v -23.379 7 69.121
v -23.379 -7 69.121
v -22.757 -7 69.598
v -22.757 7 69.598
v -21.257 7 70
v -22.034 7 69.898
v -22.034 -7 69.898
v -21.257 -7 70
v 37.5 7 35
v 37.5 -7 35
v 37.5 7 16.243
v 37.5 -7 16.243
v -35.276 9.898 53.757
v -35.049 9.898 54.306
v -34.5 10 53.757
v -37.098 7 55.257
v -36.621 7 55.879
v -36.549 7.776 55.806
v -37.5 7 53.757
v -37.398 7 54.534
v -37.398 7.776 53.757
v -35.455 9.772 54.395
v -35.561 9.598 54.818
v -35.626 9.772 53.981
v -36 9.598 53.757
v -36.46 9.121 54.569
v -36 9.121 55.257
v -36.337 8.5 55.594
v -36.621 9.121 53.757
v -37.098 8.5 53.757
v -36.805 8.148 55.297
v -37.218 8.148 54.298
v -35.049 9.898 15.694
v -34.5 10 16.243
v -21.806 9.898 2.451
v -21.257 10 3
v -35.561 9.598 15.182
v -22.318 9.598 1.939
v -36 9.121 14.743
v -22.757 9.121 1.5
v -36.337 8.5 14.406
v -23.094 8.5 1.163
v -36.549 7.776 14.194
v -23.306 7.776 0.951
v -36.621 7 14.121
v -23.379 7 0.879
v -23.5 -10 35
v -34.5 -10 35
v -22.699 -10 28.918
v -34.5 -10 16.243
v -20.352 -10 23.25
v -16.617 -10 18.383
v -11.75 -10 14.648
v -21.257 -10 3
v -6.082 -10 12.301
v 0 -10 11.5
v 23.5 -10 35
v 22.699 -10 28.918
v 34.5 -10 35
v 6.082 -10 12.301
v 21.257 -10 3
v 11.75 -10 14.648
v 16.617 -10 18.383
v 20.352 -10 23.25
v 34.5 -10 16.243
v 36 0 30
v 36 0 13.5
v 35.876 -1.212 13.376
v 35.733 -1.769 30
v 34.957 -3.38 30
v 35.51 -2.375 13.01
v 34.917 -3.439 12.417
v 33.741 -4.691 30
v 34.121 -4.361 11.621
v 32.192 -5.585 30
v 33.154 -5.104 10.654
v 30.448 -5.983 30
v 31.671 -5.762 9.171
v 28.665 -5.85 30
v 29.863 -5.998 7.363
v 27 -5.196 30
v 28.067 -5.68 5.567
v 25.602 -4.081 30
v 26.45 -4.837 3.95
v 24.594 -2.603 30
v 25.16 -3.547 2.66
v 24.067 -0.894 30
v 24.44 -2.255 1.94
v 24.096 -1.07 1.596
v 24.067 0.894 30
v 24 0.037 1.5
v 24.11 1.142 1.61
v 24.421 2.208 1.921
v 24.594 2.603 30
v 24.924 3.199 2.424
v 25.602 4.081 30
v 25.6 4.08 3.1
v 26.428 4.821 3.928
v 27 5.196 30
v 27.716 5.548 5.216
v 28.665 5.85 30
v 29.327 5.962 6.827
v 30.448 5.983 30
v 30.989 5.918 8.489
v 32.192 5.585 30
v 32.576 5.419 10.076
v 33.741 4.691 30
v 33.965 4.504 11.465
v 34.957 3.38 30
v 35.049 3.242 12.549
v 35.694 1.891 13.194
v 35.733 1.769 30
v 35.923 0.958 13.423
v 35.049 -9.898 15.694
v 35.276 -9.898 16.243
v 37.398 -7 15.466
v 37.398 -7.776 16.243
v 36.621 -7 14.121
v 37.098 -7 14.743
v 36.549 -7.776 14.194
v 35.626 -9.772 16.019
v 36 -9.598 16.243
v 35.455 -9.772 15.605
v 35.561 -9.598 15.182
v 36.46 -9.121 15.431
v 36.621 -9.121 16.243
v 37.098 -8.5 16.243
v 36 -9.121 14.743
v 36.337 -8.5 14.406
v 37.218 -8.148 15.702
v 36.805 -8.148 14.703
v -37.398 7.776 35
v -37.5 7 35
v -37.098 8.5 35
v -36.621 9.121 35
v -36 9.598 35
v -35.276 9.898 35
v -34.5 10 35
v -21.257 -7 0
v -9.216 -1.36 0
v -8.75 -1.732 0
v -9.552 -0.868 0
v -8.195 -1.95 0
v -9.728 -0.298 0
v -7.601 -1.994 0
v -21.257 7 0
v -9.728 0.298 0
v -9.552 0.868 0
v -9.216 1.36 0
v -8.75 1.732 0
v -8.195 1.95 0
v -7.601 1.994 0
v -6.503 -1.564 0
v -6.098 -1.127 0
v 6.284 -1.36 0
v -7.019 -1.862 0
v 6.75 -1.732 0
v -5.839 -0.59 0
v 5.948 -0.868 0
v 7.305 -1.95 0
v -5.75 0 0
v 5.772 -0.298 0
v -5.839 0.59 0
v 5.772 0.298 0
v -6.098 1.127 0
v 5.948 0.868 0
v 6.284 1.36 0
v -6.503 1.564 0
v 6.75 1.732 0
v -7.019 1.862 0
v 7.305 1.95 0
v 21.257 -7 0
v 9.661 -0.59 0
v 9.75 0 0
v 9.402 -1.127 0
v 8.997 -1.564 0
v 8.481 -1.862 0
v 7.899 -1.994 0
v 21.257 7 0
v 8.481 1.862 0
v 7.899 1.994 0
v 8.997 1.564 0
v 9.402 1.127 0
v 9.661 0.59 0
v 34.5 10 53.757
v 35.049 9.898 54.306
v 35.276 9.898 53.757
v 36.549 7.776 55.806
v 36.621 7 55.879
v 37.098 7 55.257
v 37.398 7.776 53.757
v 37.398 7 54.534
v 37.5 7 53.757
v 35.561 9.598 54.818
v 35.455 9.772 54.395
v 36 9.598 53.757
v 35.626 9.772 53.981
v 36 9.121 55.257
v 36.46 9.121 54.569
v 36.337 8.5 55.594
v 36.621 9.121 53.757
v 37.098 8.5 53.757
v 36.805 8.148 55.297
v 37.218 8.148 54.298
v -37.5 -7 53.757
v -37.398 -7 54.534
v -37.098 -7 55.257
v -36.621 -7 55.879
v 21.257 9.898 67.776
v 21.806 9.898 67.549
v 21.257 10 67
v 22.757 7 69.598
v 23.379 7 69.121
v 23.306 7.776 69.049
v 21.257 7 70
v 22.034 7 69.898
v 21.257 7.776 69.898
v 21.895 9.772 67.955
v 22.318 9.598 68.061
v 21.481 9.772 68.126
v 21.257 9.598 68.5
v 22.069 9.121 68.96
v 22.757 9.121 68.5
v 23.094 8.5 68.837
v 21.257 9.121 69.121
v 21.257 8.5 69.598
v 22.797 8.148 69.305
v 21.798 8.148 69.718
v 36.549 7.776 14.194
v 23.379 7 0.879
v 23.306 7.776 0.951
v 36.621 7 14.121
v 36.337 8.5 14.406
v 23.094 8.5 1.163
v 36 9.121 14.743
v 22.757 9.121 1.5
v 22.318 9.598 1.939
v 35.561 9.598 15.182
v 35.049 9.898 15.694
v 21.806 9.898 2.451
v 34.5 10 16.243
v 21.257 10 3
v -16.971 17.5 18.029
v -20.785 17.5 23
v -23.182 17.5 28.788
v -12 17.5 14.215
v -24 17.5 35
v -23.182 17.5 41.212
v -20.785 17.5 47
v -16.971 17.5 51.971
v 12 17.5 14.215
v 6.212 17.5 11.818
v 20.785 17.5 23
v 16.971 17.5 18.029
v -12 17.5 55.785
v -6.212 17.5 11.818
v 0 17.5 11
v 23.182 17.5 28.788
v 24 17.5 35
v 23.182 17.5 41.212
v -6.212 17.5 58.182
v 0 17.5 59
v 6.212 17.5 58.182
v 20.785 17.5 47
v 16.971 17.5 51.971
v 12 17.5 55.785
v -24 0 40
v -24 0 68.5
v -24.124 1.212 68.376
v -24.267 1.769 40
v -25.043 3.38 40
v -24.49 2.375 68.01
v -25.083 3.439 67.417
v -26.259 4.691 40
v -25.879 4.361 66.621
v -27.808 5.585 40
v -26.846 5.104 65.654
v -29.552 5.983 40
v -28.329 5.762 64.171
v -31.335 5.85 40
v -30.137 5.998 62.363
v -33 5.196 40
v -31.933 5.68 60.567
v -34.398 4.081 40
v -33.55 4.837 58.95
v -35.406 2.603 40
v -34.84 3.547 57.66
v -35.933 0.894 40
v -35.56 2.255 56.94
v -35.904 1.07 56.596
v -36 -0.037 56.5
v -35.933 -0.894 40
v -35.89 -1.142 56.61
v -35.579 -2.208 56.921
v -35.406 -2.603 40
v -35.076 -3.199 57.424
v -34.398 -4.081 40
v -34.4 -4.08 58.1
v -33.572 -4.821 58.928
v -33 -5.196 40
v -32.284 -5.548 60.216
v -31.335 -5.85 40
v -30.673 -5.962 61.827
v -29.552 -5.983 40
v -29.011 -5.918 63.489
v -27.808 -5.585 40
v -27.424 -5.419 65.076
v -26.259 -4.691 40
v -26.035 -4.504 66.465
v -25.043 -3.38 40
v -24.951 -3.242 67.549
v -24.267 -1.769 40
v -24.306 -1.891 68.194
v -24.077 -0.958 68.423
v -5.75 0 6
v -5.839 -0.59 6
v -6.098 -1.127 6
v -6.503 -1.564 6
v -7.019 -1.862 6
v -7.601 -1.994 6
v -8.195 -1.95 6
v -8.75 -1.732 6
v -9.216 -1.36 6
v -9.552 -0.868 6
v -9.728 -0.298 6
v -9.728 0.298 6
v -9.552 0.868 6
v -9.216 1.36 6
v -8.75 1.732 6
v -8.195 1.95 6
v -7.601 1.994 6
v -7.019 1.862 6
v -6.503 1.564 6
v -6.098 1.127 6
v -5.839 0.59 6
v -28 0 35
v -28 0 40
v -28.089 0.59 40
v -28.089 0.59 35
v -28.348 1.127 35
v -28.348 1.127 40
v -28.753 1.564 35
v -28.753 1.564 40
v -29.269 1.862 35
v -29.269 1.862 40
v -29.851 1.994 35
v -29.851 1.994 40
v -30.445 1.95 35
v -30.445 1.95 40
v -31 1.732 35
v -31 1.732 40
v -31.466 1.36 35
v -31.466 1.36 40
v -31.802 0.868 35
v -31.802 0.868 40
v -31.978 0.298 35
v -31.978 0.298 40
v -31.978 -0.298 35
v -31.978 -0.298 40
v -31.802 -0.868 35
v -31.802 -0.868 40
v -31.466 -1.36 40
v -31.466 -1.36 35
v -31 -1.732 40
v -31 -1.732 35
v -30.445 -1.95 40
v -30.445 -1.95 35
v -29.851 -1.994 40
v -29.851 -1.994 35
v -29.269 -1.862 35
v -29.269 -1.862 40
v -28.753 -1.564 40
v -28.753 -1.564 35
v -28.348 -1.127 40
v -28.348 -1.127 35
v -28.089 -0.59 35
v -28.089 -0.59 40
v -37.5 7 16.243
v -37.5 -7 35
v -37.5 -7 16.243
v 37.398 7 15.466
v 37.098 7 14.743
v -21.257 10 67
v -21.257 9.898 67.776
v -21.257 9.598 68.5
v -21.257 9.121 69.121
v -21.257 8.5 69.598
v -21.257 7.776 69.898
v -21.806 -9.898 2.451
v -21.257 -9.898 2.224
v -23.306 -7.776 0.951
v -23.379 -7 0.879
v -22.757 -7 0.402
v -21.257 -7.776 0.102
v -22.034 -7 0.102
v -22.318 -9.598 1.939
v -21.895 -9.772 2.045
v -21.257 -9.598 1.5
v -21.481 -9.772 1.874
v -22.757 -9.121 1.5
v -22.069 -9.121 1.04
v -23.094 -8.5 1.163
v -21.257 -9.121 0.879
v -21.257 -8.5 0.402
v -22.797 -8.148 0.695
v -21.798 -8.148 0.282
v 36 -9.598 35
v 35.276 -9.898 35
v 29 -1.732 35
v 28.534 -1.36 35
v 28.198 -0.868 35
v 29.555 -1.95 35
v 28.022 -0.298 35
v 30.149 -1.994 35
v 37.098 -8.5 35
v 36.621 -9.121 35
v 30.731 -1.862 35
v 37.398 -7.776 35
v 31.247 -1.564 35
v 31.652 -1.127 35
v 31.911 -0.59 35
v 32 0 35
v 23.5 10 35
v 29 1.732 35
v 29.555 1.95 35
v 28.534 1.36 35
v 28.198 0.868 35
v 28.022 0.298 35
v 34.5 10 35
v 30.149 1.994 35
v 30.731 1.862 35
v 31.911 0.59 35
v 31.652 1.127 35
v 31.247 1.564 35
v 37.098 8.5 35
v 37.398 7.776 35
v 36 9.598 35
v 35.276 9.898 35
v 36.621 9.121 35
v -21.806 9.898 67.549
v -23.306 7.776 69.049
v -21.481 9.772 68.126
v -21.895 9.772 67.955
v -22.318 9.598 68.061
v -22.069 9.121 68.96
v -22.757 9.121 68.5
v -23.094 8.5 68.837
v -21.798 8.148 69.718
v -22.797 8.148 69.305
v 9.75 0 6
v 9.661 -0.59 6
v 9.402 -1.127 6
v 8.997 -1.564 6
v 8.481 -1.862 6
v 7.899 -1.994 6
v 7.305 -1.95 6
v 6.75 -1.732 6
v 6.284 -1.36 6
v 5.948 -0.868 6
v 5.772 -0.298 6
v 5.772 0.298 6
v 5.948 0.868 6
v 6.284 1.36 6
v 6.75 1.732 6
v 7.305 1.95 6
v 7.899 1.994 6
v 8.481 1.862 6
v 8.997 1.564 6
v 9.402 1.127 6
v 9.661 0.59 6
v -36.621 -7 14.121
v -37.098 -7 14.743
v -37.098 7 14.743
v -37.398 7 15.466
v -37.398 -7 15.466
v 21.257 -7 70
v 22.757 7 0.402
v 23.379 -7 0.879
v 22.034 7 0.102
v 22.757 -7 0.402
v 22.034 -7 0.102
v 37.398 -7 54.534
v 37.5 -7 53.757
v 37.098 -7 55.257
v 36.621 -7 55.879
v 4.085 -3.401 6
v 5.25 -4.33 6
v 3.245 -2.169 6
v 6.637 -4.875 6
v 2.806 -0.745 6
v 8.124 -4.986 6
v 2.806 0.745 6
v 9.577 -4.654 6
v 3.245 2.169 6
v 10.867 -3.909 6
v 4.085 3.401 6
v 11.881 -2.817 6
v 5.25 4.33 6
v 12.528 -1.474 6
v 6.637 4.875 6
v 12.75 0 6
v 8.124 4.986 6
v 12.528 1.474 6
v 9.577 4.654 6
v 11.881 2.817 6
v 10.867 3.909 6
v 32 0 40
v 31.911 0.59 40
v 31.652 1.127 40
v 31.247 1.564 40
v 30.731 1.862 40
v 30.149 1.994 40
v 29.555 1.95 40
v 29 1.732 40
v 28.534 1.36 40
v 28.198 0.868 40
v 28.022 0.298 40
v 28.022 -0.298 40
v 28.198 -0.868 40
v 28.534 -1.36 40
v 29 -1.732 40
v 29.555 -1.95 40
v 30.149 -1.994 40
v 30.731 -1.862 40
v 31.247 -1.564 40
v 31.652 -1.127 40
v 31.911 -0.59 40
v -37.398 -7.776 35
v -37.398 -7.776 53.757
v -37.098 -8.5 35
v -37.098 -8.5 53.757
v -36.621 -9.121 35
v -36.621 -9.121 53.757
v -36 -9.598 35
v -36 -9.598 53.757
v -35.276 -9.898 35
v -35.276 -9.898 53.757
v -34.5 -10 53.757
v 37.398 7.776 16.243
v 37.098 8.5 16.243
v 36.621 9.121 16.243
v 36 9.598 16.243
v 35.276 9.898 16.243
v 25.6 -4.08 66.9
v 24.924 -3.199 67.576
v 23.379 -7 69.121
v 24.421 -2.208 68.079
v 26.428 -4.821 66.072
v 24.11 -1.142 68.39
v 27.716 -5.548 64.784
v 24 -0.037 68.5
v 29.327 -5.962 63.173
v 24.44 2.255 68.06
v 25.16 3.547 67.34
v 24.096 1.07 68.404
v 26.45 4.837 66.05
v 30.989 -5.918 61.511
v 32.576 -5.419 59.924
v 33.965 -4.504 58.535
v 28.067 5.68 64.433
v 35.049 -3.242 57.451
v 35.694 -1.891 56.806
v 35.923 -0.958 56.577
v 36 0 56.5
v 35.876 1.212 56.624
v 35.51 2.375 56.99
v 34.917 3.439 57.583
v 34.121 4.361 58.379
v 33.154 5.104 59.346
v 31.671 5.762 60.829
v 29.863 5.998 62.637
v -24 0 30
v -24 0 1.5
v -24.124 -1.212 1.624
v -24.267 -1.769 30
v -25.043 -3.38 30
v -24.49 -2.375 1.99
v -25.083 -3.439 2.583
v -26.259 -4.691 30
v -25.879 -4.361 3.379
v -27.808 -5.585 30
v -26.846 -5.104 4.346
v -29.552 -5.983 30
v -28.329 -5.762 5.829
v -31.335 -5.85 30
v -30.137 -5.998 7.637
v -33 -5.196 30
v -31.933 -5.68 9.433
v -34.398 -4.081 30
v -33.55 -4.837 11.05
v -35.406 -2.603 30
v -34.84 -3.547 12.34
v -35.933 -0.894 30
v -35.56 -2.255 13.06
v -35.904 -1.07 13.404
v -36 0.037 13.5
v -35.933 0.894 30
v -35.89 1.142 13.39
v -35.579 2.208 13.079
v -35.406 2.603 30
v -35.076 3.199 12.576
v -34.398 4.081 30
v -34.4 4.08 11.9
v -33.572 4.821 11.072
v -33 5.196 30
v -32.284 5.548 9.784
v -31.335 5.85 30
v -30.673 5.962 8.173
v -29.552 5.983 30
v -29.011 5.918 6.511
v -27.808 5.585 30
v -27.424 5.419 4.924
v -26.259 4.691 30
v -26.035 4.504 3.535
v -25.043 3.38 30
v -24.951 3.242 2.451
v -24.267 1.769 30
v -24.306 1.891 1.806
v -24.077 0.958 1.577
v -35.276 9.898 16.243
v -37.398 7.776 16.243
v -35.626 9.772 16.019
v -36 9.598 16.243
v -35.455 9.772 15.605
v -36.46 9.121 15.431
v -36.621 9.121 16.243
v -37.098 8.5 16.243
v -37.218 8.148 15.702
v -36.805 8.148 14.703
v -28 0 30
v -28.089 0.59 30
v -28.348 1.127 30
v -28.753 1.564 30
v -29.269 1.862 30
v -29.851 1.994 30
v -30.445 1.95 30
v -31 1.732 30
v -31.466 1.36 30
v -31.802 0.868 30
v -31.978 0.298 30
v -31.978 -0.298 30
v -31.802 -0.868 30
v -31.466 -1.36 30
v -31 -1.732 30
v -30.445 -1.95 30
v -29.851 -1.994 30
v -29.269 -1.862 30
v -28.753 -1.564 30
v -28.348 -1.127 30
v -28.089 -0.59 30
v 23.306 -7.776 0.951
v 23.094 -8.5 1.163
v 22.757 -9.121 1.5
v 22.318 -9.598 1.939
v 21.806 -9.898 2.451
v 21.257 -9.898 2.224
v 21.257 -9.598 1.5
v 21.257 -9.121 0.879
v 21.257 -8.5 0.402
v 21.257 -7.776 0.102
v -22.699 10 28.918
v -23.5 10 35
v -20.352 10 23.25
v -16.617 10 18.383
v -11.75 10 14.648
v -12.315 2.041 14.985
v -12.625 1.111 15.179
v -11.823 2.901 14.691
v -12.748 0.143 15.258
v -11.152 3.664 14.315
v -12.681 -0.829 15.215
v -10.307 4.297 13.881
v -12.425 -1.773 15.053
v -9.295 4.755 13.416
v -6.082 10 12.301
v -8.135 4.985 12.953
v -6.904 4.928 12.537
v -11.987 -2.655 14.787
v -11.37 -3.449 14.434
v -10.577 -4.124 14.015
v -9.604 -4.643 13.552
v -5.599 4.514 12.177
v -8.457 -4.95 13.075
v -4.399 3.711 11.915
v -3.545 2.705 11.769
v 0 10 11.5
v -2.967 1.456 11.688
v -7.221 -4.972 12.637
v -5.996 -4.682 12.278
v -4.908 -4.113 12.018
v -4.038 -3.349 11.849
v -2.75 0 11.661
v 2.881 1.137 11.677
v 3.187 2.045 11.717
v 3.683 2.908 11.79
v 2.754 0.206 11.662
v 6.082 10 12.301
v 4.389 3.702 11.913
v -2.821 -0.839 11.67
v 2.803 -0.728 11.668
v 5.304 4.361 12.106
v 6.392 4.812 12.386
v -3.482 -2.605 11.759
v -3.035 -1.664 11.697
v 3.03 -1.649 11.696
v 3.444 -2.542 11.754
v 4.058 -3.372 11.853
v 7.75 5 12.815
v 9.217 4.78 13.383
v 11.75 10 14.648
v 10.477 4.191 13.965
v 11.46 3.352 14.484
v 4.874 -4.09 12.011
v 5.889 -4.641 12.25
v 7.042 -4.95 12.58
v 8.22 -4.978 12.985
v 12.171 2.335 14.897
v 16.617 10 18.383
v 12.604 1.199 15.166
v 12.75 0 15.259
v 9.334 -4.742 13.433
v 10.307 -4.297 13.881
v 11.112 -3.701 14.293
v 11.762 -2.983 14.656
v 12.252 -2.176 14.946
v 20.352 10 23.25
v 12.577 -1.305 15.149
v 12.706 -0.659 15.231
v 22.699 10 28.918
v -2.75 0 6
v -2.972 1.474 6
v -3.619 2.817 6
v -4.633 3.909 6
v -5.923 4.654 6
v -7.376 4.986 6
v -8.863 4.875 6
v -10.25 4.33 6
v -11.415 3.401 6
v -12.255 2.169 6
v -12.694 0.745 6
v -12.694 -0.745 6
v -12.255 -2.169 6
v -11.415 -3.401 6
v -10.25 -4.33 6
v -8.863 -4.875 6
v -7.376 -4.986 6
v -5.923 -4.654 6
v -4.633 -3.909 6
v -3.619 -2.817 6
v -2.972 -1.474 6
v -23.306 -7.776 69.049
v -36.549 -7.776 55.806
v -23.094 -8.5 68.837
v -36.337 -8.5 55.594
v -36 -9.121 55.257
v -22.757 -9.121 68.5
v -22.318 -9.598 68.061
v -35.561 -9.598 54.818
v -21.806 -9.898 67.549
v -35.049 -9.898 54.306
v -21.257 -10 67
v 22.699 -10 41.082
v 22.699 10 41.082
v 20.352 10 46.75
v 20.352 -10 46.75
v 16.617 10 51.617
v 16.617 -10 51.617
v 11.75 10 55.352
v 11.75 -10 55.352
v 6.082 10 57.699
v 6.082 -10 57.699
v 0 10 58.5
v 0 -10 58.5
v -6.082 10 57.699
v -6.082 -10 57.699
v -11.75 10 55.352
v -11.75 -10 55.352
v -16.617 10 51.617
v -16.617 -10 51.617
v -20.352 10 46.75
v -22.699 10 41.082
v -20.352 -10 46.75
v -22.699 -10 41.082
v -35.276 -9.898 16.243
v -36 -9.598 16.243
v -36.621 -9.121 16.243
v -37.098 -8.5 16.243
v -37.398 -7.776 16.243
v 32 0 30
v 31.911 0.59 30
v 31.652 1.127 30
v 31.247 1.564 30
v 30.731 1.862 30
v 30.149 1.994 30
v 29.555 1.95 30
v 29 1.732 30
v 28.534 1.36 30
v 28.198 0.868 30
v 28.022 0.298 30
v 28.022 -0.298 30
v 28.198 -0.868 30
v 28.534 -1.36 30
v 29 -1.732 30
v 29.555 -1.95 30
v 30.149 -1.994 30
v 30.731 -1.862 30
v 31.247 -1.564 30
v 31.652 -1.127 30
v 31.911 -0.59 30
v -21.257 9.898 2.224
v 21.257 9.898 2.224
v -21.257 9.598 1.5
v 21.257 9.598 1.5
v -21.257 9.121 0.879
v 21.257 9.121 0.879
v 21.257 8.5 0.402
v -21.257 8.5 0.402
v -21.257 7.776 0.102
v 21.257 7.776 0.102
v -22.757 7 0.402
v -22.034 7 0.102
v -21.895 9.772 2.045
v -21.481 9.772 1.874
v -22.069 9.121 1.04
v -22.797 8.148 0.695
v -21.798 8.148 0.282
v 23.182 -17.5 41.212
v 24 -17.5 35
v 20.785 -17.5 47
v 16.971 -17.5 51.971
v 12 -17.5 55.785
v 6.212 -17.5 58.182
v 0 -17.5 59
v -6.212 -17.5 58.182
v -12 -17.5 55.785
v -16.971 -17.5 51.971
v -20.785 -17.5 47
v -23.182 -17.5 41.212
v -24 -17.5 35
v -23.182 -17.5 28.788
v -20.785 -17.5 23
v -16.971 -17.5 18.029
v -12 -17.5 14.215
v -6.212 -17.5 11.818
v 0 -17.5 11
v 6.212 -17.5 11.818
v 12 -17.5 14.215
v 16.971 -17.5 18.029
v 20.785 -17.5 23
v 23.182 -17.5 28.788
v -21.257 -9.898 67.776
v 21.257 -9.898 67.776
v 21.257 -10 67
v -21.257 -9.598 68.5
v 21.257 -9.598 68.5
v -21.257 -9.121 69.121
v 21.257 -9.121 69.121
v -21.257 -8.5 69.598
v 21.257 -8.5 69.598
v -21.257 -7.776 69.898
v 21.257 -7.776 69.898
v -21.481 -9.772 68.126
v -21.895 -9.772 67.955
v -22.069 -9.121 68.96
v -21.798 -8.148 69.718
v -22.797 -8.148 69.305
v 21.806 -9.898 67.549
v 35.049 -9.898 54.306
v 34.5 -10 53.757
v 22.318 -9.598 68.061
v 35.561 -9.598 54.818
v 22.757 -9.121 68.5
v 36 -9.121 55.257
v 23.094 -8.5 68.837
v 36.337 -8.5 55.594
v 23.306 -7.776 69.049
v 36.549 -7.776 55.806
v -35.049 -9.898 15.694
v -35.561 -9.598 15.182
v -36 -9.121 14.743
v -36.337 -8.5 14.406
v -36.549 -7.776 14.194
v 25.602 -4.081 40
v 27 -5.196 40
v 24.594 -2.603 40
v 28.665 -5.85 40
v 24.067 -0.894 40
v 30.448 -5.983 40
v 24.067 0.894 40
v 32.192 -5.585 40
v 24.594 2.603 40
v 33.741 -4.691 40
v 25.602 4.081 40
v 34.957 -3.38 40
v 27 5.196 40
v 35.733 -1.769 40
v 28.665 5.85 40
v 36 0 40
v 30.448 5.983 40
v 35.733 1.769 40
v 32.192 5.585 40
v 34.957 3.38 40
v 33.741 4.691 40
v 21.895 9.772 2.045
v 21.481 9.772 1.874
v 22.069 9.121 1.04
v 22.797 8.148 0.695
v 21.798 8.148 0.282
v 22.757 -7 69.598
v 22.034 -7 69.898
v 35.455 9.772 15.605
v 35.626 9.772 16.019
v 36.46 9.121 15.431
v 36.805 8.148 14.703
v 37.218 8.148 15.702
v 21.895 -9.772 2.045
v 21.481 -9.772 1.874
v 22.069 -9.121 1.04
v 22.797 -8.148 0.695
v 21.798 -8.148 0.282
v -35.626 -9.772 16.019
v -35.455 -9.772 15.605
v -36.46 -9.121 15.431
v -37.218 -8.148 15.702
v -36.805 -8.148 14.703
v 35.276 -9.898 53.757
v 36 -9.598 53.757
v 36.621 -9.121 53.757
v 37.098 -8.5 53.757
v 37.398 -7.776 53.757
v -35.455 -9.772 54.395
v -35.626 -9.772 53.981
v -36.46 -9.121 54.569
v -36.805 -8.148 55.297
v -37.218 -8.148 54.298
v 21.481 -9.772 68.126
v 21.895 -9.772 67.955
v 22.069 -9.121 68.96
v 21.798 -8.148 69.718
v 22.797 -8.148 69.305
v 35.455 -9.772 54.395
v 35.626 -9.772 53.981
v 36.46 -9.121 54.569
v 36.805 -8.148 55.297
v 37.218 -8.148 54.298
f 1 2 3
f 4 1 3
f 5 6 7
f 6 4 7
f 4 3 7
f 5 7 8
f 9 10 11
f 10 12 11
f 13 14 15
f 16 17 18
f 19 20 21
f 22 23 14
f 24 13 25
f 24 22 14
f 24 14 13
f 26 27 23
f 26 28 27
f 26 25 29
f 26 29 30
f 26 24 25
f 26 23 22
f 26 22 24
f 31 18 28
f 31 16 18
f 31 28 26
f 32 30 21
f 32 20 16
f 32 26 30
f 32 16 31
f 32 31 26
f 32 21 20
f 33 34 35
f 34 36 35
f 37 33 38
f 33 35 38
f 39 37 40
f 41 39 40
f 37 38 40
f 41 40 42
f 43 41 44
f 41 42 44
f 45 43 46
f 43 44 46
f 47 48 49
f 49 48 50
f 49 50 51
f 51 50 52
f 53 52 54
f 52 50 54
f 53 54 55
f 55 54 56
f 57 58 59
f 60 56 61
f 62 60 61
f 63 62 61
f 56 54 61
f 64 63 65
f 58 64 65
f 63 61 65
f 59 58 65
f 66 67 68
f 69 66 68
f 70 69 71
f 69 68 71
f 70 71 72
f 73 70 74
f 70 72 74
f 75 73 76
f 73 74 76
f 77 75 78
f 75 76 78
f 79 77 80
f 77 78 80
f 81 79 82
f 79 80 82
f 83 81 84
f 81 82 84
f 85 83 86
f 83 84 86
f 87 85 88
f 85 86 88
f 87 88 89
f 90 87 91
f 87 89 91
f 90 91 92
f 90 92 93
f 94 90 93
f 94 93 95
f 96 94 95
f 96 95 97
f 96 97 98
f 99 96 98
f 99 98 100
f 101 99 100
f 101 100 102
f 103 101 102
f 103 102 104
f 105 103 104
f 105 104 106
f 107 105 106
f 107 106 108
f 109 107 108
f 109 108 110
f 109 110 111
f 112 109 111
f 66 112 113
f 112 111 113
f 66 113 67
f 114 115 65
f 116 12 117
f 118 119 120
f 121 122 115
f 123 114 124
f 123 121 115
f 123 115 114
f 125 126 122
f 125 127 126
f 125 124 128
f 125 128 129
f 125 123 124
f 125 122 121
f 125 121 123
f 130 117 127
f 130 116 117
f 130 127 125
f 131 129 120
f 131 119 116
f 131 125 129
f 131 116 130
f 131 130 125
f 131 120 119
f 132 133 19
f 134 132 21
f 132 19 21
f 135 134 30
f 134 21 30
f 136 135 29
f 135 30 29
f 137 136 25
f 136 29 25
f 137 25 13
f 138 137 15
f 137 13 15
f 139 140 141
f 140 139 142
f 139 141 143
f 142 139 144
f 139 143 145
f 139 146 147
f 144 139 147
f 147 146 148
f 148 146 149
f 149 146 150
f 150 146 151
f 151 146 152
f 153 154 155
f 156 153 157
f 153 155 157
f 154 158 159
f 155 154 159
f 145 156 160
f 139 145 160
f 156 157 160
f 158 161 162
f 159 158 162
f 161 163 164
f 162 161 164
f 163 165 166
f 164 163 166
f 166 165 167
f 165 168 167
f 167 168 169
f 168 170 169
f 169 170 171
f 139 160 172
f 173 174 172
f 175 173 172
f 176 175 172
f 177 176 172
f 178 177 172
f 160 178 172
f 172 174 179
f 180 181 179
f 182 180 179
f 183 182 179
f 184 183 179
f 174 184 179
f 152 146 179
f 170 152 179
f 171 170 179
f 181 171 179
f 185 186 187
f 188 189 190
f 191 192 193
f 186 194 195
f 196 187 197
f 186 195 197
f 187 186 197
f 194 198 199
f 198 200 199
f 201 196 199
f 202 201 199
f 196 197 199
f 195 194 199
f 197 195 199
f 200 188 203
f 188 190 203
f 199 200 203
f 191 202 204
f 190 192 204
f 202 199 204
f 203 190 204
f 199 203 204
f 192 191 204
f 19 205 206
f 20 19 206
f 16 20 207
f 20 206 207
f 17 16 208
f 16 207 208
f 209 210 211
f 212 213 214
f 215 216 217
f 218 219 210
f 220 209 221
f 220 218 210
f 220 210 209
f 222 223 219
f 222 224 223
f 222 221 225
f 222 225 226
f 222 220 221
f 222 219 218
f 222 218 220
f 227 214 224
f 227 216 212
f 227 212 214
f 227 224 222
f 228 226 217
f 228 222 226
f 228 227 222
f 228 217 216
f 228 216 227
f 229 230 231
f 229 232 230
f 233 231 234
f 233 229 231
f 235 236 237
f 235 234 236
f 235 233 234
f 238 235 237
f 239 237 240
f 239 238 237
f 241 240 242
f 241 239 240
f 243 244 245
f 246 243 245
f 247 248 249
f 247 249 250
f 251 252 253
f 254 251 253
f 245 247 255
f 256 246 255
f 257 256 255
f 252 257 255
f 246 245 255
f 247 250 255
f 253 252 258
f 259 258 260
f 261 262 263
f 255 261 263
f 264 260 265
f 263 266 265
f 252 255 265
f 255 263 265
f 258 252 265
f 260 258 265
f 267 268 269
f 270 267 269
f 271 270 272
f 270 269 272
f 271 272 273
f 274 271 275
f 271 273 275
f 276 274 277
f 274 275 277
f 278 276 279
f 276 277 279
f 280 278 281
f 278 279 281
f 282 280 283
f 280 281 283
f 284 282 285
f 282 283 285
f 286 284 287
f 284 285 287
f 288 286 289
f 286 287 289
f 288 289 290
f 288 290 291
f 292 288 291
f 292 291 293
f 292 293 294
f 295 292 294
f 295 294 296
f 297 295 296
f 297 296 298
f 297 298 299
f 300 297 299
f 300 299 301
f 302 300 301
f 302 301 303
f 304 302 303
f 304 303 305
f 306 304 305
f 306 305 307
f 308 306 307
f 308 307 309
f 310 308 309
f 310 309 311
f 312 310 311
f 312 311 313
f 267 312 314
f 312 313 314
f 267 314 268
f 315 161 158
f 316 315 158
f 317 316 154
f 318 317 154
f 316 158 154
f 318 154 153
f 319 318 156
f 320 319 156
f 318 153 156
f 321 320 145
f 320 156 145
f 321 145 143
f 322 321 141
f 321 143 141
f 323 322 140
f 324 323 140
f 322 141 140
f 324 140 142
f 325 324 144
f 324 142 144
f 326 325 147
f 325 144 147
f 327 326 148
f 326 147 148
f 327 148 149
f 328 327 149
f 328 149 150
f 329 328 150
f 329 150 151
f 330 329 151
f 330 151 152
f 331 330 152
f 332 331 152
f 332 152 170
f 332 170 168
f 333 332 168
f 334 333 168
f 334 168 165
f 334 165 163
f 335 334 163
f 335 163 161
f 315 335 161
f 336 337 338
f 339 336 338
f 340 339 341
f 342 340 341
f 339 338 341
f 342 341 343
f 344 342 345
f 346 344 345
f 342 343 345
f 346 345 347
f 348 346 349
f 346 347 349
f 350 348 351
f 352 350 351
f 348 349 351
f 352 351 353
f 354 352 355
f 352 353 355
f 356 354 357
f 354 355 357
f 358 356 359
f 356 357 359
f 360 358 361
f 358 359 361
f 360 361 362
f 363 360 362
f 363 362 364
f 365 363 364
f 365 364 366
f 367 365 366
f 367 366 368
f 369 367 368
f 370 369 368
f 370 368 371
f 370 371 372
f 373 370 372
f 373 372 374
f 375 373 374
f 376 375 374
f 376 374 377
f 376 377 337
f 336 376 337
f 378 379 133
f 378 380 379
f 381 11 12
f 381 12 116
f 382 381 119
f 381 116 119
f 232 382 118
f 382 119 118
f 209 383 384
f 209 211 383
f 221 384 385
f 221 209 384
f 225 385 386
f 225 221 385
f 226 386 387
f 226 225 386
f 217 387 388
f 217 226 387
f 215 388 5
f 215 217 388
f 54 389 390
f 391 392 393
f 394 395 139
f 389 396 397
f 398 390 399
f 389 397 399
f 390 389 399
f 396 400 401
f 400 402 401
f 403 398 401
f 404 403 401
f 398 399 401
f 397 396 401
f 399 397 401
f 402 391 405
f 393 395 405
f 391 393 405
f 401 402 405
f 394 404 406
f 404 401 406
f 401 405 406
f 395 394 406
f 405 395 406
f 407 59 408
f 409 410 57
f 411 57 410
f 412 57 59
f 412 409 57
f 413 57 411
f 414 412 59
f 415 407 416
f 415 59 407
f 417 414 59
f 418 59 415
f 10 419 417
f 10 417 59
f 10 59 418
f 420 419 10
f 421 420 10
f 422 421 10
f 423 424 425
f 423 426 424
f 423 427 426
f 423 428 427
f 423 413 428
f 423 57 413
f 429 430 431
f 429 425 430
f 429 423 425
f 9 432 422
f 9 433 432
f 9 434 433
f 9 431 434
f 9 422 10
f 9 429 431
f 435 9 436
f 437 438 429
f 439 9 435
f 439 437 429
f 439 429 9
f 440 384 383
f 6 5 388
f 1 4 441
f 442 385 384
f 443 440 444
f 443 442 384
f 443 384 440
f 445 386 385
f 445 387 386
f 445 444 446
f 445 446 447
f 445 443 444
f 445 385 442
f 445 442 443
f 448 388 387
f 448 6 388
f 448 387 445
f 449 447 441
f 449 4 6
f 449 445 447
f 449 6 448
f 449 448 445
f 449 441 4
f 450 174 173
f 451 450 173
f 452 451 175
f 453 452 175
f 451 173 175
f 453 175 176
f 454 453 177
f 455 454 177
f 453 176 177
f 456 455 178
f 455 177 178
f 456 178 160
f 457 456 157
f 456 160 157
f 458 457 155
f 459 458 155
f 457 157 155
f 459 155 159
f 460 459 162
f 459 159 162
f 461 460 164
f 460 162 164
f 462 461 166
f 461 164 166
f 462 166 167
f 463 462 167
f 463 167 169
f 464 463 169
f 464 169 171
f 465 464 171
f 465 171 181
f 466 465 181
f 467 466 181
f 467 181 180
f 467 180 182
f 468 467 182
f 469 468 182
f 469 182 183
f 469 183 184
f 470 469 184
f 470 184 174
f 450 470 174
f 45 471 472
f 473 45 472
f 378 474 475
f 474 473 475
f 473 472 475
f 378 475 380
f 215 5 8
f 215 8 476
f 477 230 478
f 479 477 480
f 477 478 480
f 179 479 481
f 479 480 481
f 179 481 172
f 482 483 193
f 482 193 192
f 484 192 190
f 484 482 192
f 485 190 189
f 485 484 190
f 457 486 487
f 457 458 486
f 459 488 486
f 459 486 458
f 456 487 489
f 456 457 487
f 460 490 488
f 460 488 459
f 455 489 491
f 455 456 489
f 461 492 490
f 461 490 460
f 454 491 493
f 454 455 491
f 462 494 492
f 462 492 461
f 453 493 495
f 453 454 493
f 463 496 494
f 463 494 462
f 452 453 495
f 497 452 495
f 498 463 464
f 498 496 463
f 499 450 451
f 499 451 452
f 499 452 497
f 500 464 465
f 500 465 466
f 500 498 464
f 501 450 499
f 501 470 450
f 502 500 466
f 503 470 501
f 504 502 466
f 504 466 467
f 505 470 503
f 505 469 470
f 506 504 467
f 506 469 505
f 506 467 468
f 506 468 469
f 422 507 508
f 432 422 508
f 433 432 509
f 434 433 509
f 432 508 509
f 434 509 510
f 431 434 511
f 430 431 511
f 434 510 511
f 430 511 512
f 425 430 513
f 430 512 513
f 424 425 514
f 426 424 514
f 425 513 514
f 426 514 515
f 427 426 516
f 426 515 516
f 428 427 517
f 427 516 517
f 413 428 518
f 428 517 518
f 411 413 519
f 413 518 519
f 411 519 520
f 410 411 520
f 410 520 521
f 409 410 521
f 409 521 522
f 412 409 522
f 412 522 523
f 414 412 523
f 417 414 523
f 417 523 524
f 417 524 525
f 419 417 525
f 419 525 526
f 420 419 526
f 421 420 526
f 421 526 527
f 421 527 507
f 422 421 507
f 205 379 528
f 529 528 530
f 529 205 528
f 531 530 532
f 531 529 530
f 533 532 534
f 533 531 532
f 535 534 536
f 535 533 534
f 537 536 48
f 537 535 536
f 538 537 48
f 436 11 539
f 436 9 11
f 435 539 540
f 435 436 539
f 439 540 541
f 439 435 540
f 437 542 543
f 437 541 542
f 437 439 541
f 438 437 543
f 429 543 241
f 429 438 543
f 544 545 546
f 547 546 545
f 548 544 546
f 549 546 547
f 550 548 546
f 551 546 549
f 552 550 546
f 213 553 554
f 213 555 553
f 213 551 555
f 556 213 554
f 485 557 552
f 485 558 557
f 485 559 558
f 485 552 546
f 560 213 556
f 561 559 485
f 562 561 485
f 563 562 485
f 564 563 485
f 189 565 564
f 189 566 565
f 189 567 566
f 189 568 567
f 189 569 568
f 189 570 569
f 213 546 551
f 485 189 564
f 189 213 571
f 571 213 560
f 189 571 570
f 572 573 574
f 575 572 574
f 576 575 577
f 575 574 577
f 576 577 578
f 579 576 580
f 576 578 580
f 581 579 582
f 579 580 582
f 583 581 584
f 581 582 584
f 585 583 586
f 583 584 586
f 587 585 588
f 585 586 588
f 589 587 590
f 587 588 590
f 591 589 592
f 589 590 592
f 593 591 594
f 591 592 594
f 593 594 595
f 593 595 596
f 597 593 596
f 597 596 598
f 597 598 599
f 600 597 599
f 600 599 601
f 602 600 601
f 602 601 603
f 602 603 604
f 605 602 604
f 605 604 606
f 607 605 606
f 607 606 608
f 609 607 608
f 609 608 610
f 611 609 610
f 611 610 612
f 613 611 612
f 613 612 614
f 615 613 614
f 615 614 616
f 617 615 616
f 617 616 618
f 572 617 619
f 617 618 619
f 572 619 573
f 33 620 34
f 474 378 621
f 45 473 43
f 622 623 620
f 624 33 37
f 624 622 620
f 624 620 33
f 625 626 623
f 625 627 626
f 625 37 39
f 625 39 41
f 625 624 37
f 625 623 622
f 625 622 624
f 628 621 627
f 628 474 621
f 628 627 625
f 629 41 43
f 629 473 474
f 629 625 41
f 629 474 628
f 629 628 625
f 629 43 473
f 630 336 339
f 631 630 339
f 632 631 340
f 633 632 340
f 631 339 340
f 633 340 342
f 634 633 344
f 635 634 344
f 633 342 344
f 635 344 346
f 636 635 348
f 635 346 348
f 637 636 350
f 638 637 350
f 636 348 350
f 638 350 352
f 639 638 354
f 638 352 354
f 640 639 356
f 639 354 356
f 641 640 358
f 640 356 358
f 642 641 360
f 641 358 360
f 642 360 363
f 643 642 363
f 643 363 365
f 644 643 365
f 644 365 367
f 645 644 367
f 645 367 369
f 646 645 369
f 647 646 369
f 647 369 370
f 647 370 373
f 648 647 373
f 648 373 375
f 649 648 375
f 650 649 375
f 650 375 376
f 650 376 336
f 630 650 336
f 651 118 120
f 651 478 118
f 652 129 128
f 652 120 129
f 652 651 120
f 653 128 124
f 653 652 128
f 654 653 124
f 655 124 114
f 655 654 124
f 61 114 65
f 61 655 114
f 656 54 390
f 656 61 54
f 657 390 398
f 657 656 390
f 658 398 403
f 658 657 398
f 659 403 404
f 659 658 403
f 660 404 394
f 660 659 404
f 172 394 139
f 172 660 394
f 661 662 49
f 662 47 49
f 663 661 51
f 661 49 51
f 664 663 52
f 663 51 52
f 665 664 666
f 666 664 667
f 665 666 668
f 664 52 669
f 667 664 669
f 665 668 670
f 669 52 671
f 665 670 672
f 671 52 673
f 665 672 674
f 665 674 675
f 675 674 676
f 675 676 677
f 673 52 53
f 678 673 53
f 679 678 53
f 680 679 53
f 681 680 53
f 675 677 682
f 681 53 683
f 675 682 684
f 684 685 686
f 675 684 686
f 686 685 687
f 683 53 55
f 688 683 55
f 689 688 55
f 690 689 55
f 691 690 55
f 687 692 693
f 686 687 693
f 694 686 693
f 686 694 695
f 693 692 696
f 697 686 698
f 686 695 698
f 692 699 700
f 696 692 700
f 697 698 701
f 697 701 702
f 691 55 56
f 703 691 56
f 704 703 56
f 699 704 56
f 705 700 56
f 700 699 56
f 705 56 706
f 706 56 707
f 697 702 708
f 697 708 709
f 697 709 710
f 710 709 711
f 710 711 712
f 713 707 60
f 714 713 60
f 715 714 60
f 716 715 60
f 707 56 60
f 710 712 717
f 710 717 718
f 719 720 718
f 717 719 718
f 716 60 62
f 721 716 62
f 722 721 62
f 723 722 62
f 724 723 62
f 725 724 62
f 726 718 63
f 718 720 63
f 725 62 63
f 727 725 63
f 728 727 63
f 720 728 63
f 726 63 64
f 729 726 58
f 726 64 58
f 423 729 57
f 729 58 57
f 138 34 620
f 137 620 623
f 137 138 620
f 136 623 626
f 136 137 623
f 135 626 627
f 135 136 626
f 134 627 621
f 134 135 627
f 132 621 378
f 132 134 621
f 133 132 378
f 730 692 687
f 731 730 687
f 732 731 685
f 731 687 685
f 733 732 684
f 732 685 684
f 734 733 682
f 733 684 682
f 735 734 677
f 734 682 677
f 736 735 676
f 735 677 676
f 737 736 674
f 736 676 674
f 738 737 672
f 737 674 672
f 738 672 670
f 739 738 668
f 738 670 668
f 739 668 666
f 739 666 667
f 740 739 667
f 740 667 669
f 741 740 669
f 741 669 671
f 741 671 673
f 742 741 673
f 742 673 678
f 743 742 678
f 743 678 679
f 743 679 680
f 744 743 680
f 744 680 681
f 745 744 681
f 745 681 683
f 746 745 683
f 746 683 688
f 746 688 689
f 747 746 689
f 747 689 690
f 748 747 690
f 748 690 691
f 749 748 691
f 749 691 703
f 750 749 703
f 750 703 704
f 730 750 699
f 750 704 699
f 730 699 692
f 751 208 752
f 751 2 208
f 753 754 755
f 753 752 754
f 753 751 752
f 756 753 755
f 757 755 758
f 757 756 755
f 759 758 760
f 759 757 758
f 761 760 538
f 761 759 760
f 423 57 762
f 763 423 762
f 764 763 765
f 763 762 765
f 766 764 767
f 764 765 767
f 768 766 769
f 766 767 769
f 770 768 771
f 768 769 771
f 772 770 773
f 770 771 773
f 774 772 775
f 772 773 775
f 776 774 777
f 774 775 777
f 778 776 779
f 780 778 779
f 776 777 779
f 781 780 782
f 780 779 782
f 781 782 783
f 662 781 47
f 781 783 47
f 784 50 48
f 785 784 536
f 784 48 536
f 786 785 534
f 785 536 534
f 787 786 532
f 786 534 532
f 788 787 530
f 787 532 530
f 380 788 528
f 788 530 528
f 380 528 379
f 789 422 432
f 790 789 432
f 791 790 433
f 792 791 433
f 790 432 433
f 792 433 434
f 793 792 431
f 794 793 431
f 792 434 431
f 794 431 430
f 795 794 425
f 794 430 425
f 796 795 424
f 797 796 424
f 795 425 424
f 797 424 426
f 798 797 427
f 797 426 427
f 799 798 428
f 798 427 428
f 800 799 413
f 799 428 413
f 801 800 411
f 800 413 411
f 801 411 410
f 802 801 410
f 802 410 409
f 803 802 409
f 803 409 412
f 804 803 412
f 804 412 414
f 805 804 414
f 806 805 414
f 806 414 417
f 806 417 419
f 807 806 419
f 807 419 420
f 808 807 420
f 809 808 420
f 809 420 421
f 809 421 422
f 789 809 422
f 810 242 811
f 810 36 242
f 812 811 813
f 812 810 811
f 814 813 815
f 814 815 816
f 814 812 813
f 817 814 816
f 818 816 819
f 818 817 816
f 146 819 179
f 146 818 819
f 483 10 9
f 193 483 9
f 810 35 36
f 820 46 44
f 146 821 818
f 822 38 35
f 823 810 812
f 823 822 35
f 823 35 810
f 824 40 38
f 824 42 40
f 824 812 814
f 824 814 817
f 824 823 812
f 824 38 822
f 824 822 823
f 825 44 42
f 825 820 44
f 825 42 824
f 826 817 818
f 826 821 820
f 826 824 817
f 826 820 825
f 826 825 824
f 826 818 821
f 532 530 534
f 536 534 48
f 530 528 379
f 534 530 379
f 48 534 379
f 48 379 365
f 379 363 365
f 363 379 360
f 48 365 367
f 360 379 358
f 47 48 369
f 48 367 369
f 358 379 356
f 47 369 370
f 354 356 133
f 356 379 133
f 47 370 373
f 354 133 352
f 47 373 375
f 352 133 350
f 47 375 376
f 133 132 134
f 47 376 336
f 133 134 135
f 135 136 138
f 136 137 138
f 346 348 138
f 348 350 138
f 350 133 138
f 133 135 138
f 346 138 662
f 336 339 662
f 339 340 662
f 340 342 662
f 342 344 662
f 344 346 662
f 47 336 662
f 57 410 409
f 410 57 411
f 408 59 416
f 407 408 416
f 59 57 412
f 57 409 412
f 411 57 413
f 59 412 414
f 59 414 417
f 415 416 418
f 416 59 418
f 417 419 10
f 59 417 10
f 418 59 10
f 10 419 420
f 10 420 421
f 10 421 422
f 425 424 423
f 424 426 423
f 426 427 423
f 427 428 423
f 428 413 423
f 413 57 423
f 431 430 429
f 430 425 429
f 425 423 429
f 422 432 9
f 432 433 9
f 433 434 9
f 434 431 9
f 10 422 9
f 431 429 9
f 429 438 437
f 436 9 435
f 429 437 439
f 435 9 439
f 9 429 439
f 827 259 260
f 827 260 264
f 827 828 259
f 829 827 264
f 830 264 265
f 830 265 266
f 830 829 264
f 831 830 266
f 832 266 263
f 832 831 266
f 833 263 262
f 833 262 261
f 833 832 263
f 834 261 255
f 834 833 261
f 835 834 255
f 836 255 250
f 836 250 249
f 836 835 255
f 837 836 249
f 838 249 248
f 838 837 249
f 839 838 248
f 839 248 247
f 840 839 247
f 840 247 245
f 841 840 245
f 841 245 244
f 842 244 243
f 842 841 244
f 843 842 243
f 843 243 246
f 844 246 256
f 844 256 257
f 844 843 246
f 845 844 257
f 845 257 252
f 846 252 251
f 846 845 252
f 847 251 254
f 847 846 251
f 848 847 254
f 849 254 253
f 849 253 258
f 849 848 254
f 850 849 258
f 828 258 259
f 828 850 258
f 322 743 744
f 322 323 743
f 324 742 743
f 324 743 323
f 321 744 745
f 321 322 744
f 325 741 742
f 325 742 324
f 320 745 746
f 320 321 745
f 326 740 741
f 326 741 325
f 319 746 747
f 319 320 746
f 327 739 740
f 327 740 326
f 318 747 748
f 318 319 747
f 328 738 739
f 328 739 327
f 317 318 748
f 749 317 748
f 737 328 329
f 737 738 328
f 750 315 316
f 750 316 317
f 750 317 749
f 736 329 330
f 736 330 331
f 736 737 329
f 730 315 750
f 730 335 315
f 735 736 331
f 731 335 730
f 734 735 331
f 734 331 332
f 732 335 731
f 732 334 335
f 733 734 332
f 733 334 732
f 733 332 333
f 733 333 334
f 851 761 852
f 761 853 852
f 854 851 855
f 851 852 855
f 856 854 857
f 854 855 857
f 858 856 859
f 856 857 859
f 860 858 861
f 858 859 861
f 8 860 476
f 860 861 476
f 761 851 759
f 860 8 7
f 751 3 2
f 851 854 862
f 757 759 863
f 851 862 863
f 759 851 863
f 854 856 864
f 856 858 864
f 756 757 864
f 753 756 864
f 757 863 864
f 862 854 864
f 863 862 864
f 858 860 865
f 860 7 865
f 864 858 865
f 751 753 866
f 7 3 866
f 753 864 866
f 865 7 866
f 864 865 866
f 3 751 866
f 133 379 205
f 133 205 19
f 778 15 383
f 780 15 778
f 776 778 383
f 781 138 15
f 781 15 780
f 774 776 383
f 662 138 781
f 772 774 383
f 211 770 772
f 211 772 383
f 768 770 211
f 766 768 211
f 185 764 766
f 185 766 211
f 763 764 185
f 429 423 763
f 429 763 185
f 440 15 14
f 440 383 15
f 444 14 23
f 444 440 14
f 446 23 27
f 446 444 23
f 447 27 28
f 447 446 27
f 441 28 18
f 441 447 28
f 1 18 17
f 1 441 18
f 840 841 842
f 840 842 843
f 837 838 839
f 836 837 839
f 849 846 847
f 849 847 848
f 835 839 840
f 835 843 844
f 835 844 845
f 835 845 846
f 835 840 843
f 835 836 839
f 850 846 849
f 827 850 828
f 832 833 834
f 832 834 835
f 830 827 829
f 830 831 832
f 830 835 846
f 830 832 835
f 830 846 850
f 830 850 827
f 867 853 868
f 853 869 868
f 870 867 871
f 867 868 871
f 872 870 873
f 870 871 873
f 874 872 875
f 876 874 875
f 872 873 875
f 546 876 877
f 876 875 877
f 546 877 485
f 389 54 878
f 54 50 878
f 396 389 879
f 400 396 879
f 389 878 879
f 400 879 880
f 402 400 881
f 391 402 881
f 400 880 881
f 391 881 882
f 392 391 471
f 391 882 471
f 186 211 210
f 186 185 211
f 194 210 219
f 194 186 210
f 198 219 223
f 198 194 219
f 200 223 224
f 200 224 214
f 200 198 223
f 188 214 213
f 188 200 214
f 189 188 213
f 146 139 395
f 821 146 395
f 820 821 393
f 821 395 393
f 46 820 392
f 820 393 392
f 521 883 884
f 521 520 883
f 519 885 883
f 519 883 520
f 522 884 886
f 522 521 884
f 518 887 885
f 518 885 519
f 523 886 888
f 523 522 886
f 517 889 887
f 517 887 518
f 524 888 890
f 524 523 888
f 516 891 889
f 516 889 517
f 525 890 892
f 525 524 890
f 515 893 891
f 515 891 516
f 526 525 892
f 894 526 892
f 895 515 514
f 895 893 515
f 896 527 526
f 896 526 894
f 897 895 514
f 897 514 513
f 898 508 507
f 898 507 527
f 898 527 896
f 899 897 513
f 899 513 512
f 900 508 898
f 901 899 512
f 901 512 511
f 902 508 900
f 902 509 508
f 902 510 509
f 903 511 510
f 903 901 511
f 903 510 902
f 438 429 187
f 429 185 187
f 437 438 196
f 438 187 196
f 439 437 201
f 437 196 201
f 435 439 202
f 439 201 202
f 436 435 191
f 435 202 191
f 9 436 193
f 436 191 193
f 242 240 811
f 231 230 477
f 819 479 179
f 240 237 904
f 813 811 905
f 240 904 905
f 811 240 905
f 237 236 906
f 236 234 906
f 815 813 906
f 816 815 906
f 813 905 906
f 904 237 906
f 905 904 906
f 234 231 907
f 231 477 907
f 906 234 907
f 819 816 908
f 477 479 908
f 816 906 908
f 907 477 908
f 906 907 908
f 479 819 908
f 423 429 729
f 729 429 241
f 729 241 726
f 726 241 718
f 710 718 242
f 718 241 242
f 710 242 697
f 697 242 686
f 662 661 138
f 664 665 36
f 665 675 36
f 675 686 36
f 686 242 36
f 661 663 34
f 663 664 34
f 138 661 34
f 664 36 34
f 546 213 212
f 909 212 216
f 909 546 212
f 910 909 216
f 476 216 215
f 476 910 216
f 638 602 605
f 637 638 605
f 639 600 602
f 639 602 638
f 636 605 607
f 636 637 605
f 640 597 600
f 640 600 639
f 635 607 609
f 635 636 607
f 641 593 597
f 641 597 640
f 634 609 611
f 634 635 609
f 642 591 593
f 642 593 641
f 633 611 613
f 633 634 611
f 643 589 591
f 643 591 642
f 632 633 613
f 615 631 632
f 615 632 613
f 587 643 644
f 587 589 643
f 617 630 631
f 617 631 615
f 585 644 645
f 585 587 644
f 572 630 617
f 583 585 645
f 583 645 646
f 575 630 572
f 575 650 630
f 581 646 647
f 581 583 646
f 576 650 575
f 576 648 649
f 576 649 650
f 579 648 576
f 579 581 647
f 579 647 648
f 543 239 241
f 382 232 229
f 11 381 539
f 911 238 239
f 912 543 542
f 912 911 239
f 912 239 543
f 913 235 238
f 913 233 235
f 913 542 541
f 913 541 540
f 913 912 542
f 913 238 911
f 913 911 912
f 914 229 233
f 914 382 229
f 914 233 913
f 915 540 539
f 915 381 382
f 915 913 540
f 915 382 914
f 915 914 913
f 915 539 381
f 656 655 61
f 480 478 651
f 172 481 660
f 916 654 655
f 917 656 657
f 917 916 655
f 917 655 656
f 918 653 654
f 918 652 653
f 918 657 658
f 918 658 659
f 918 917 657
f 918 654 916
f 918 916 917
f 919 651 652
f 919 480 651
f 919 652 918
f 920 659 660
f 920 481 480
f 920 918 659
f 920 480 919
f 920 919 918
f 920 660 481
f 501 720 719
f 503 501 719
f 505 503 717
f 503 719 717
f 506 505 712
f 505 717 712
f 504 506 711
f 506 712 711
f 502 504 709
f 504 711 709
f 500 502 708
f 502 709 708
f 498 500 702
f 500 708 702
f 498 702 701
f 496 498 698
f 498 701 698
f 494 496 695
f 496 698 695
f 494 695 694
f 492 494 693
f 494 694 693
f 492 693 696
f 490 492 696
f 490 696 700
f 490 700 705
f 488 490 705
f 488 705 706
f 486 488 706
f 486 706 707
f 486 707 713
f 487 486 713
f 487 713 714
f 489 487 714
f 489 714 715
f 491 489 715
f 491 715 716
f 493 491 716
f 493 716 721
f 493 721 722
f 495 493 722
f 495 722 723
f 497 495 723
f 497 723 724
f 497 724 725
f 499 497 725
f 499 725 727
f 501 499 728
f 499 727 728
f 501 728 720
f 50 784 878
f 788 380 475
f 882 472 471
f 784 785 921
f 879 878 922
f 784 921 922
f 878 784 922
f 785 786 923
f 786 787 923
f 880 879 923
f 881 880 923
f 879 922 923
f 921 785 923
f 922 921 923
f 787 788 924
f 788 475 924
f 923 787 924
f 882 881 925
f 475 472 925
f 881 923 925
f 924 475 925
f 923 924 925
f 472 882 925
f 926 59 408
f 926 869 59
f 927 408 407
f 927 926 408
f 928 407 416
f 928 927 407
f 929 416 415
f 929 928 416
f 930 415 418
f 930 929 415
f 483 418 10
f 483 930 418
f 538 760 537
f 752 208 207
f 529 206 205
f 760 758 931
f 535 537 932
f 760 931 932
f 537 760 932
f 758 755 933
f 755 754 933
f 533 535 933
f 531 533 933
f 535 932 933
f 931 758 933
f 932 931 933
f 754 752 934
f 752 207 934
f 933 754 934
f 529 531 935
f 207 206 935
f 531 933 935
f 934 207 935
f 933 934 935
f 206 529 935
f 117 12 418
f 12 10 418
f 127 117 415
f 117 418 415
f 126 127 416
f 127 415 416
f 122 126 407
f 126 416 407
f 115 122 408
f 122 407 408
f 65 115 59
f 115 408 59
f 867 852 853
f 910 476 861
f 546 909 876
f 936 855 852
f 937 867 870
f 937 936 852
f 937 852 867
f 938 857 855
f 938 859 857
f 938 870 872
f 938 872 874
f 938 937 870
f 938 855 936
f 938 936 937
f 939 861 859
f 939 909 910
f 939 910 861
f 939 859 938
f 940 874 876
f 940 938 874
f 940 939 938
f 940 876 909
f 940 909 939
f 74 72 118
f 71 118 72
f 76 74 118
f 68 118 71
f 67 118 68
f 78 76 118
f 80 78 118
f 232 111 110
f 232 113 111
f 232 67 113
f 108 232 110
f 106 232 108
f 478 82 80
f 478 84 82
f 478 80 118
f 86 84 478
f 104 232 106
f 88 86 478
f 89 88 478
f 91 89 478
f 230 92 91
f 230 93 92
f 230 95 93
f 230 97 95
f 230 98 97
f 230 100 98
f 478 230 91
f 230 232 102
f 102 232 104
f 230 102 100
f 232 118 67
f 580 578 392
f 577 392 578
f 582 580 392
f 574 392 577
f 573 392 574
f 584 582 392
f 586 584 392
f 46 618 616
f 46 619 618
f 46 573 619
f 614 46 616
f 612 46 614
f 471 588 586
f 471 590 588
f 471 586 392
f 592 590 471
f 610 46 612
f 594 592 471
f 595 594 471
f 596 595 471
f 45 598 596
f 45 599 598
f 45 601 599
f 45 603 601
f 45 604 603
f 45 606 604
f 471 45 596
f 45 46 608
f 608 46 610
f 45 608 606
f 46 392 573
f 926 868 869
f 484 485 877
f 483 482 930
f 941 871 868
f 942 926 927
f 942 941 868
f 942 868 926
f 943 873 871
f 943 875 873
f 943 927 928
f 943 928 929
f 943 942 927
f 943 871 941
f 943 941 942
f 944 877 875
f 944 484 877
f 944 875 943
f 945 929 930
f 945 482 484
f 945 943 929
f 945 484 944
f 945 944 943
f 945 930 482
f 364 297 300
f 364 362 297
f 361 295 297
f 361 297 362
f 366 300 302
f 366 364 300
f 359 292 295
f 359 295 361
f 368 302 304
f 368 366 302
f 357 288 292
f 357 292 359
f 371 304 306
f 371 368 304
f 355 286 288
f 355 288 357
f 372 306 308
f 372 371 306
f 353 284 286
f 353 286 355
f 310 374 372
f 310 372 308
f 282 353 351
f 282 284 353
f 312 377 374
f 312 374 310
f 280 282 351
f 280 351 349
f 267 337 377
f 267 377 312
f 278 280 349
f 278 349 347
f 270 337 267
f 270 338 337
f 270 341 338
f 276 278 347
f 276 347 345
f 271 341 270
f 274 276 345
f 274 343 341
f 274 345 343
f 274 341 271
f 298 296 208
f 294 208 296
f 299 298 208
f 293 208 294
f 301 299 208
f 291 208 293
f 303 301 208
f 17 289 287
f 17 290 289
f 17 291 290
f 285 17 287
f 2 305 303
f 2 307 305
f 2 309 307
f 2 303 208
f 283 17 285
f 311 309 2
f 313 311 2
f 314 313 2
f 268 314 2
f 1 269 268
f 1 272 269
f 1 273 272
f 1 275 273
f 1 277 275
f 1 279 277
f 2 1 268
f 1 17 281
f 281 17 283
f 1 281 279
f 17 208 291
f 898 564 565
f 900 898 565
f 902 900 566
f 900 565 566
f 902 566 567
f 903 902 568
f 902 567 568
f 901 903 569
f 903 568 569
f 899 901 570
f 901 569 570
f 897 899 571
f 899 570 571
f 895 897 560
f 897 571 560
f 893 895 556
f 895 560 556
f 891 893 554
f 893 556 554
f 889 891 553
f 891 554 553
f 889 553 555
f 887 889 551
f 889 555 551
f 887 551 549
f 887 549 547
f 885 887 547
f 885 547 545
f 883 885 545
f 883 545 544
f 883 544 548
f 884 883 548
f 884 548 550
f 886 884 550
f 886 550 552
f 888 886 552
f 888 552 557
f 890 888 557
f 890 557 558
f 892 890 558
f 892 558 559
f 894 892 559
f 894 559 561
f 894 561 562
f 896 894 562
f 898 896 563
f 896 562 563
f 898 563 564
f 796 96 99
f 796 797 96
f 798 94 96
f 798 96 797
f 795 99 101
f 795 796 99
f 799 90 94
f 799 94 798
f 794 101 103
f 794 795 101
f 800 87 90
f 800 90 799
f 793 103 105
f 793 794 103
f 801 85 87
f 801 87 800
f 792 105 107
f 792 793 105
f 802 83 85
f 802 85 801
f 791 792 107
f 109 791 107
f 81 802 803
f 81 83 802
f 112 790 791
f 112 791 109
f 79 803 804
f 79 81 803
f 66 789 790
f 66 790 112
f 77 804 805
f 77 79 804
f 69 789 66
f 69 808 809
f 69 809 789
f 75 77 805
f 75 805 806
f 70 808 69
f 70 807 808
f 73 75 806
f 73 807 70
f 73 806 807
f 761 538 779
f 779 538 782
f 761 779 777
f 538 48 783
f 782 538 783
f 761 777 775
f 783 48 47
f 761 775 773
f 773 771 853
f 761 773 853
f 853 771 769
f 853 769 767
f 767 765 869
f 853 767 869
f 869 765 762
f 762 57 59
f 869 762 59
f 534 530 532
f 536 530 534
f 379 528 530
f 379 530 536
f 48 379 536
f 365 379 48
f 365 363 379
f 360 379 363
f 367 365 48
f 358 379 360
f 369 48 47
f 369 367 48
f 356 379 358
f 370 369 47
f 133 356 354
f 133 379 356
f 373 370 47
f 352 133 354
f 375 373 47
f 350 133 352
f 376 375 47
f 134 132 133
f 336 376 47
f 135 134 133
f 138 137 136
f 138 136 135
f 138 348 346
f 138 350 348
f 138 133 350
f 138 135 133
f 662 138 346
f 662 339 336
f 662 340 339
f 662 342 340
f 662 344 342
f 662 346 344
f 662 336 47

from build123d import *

# Parameters (mm, degrees)
F0_W          = 30
F0_H          = 20
F0_W_2        = 22.5
F1_DEPTH      = 35
F2_R          = 23.5
F3_DEPTH      = 25
F4_R          = 2
F5_DEPTH      = 25
F6_R          = 5
F7_DEPTH      = 29
F8_R          = 2
F9_DEPTH      = 35.001
F9_DEPTH_BACK = 107
F10_W         = 75
F10_H         = 20
F11_DEPTH     = 35
F12_R         = 23.5
F13_DEPTH     = 25
F14_R         = 2
F15_DEPTH     = 50
F16_R         = 6
F17_DEPTH     = 30
F18_T1_DEPTH  = 97.150489639
F19_T1_DEPTH  = 97.150489639
F20_R         = 24
F21_DEPTH     = 17.5
F22_R         = 3
F22_2_R       = 3
F23_R         = 6
F24_DEPTH     = 30


# Not quite as in the source:
# - a fillet or chamfer that OpenCascade refuses, or shapes differently, is made with other operations: its cross-section is extruded or revolved along the edge and cut away or added
# - an extrude ends at something that could not be found from the text; its depth is read off the source's solid
# - a feature names something its author has since deleted; it is built from what else it names


with BuildPart() as f1:
    # F0 (on Top) → F1 (new body)
    with BuildSketch(Plane.XY):
        Rectangle(F0_W, F0_H)
        with Locations((26.25, 0)):
            Rectangle(F0_W_2, F0_H)
        with Locations((-26.25, 0)):
            Rectangle(F0_W_2, F0_H)
    extrude(amount=F1_DEPTH)

    # F2 (on Front) → F3 (cut, symmetric)
    with BuildSketch(Plane.XZ):
        with Locations((0, 35)):
            Circle(F2_R)
    extrude(amount=F3_DEPTH, both=True, mode=Mode.SUBTRACT)

    # F4 (on face) → F5 (cut)
    with BuildSketch(Plane(origin=(0, 0, 0), x_dir=(1, 0, 0), z_dir=(0, 0, -1))):
        with Locations((7.75, 0)):
            Circle(F4_R)
        with Locations((-7.75, 0)):
            Circle(F4_R)
    extrude(amount=-F5_DEPTH, mode=Mode.SUBTRACT)

    # F6 (on face) → F7 (cut)
    with BuildSketch(Plane.XY.offset(35)):
        with Locations((7.75, 0)):
            Circle(F6_R)
        with Locations((-7.75, 0)):
            Circle(F6_R)
    extrude(amount=-F7_DEPTH, mode=Mode.SUBTRACT)

    # F8 (on face) → F9 (cut, two sides)
    with BuildSketch(Plane.XY.offset(35)) as f9_sk:
        with Locations((30, 0)):
            Circle(F8_R)
        with Locations((-30, 0)):
            Circle(F8_R)
    extrude(amount=-F9_DEPTH, mode=Mode.SUBTRACT)
    extrude(f9_sk.sketch, amount=F9_DEPTH_BACK, mode=Mode.SUBTRACT)

    # F19: chamfer of 15 on 2 edges, made by hand

    # F19_s2 → F19_t1 (cut)
    with BuildSketch(Plane.XZ.offset(-48.5752448195)):
        Polygon((37.5, 15), (22.5, 0), (37.5, 0), align=None)
        Polygon((-22.5, 0), (-37.5, 15), (-37.5, 0), align=None)
    extrude(amount=F19_T1_DEPTH, mode=Mode.SUBTRACT)

    # F22
    f22_edges = [f1.edges().sort_by_distance(p)[0] for p in [
        (37.5, -10, 25),
        (30, -10, 7.5),
        (37.5, 0, 15),
        (-37.5, -10, 25),
        (-30, -10, 7.5),
        (-37.5, 10, 25),
        (-30, 10, 7.5),
        (30, 10, 7.5),
        (37.5, 10, 25),
        (-37.5, 0, 15),
        (0, -10, 0),
        (0, 10, 0),
        (22.5, 0, 0),
        (-22.5, 0, 0),
    ]]
    fillet(f22_edges, radius=F22_R)

    # F23 (on face) → F24 (cut)
    with BuildSketch(Plane(origin=(0, 0, 0), x_dir=(1, 0, 0), z_dir=(0, 0, -1))):
        with Locations((30, 0)):
            Circle(F23_R)
        with Locations((-30, 0)):
            Circle(F23_R)
    extrude(amount=-F24_DEPTH, mode=Mode.SUBTRACT)


with BuildPart() as f11:
    # F10 (on face) → F11 (new body)
    with BuildSketch(Plane.XY.offset(35)):
        Rectangle(F10_W, F10_H)
    extrude(amount=F11_DEPTH)

    # F12 (on face) → F13 (cut, symmetric)
    with BuildSketch(Plane.XZ.offset(10)):
        with Locations((0, 35)):
            Circle(F12_R)
    extrude(amount=F13_DEPTH, both=True, mode=Mode.SUBTRACT)

    # F14 (on face) → F15 (cut)
    with BuildSketch(Plane.XY.offset(70)):
        with Locations((30, 0)):
            Circle(F14_R)
        with Locations((-30, 0)):
            Circle(F14_R)
    extrude(amount=-F15_DEPTH, mode=Mode.SUBTRACT)

    # F16 (on face) → F17 (cut)
    with BuildSketch(Plane.XY.offset(70)):
        with Locations((30, 0)):
            Circle(F16_R)
        with Locations((-30, 0)):
            Circle(F16_R)
    extrude(amount=-F17_DEPTH, mode=Mode.SUBTRACT)

    # F18: chamfer of 15 on 2 edges, made by hand

    # F18_s2 → F18_t1 (cut)
    with BuildSketch(Plane.XZ.offset(-48.5752448195)):
        Polygon((22.5, 70), (37.5, 55), (37.5, 70), align=None)
        Polygon((-37.5, 55), (-22.5, 70), (-37.5, 70), align=None)
    extrude(amount=F18_T1_DEPTH, mode=Mode.SUBTRACT)

    # F22#2
    f22_2_edges = [f11.edges().sort_by_distance(p)[0] for p in [
        (22.5, 0, 70),
        (37.5, 0, 55),
        (0, -10, 70),
        (30, -10, 62.5),
        (37.5, -10, 45),
        (-30, -10, 62.5),
        (-37.5, -10, 45),
        (30, 10, 62.5),
        (0, 10, 70),
        (-30, 10, 62.5),
        (-37.5, 10, 45),
        (37.5, 10, 45),
        (-37.5, 0, 55),
        (-22.5, 0, 70),
    ]]
    fillet(f22_2_edges, radius=F22_2_R)


with BuildPart() as f21:
    # F20 (on Front) → F21 (new body, symmetric)
    with BuildSketch(Plane.XZ):
        with Locations((0, 35)):
            Circle(F20_R)
    extrude(amount=F21_DEPTH, both=True)


solid = Compound([f1.part, f11.part, f21.part])
